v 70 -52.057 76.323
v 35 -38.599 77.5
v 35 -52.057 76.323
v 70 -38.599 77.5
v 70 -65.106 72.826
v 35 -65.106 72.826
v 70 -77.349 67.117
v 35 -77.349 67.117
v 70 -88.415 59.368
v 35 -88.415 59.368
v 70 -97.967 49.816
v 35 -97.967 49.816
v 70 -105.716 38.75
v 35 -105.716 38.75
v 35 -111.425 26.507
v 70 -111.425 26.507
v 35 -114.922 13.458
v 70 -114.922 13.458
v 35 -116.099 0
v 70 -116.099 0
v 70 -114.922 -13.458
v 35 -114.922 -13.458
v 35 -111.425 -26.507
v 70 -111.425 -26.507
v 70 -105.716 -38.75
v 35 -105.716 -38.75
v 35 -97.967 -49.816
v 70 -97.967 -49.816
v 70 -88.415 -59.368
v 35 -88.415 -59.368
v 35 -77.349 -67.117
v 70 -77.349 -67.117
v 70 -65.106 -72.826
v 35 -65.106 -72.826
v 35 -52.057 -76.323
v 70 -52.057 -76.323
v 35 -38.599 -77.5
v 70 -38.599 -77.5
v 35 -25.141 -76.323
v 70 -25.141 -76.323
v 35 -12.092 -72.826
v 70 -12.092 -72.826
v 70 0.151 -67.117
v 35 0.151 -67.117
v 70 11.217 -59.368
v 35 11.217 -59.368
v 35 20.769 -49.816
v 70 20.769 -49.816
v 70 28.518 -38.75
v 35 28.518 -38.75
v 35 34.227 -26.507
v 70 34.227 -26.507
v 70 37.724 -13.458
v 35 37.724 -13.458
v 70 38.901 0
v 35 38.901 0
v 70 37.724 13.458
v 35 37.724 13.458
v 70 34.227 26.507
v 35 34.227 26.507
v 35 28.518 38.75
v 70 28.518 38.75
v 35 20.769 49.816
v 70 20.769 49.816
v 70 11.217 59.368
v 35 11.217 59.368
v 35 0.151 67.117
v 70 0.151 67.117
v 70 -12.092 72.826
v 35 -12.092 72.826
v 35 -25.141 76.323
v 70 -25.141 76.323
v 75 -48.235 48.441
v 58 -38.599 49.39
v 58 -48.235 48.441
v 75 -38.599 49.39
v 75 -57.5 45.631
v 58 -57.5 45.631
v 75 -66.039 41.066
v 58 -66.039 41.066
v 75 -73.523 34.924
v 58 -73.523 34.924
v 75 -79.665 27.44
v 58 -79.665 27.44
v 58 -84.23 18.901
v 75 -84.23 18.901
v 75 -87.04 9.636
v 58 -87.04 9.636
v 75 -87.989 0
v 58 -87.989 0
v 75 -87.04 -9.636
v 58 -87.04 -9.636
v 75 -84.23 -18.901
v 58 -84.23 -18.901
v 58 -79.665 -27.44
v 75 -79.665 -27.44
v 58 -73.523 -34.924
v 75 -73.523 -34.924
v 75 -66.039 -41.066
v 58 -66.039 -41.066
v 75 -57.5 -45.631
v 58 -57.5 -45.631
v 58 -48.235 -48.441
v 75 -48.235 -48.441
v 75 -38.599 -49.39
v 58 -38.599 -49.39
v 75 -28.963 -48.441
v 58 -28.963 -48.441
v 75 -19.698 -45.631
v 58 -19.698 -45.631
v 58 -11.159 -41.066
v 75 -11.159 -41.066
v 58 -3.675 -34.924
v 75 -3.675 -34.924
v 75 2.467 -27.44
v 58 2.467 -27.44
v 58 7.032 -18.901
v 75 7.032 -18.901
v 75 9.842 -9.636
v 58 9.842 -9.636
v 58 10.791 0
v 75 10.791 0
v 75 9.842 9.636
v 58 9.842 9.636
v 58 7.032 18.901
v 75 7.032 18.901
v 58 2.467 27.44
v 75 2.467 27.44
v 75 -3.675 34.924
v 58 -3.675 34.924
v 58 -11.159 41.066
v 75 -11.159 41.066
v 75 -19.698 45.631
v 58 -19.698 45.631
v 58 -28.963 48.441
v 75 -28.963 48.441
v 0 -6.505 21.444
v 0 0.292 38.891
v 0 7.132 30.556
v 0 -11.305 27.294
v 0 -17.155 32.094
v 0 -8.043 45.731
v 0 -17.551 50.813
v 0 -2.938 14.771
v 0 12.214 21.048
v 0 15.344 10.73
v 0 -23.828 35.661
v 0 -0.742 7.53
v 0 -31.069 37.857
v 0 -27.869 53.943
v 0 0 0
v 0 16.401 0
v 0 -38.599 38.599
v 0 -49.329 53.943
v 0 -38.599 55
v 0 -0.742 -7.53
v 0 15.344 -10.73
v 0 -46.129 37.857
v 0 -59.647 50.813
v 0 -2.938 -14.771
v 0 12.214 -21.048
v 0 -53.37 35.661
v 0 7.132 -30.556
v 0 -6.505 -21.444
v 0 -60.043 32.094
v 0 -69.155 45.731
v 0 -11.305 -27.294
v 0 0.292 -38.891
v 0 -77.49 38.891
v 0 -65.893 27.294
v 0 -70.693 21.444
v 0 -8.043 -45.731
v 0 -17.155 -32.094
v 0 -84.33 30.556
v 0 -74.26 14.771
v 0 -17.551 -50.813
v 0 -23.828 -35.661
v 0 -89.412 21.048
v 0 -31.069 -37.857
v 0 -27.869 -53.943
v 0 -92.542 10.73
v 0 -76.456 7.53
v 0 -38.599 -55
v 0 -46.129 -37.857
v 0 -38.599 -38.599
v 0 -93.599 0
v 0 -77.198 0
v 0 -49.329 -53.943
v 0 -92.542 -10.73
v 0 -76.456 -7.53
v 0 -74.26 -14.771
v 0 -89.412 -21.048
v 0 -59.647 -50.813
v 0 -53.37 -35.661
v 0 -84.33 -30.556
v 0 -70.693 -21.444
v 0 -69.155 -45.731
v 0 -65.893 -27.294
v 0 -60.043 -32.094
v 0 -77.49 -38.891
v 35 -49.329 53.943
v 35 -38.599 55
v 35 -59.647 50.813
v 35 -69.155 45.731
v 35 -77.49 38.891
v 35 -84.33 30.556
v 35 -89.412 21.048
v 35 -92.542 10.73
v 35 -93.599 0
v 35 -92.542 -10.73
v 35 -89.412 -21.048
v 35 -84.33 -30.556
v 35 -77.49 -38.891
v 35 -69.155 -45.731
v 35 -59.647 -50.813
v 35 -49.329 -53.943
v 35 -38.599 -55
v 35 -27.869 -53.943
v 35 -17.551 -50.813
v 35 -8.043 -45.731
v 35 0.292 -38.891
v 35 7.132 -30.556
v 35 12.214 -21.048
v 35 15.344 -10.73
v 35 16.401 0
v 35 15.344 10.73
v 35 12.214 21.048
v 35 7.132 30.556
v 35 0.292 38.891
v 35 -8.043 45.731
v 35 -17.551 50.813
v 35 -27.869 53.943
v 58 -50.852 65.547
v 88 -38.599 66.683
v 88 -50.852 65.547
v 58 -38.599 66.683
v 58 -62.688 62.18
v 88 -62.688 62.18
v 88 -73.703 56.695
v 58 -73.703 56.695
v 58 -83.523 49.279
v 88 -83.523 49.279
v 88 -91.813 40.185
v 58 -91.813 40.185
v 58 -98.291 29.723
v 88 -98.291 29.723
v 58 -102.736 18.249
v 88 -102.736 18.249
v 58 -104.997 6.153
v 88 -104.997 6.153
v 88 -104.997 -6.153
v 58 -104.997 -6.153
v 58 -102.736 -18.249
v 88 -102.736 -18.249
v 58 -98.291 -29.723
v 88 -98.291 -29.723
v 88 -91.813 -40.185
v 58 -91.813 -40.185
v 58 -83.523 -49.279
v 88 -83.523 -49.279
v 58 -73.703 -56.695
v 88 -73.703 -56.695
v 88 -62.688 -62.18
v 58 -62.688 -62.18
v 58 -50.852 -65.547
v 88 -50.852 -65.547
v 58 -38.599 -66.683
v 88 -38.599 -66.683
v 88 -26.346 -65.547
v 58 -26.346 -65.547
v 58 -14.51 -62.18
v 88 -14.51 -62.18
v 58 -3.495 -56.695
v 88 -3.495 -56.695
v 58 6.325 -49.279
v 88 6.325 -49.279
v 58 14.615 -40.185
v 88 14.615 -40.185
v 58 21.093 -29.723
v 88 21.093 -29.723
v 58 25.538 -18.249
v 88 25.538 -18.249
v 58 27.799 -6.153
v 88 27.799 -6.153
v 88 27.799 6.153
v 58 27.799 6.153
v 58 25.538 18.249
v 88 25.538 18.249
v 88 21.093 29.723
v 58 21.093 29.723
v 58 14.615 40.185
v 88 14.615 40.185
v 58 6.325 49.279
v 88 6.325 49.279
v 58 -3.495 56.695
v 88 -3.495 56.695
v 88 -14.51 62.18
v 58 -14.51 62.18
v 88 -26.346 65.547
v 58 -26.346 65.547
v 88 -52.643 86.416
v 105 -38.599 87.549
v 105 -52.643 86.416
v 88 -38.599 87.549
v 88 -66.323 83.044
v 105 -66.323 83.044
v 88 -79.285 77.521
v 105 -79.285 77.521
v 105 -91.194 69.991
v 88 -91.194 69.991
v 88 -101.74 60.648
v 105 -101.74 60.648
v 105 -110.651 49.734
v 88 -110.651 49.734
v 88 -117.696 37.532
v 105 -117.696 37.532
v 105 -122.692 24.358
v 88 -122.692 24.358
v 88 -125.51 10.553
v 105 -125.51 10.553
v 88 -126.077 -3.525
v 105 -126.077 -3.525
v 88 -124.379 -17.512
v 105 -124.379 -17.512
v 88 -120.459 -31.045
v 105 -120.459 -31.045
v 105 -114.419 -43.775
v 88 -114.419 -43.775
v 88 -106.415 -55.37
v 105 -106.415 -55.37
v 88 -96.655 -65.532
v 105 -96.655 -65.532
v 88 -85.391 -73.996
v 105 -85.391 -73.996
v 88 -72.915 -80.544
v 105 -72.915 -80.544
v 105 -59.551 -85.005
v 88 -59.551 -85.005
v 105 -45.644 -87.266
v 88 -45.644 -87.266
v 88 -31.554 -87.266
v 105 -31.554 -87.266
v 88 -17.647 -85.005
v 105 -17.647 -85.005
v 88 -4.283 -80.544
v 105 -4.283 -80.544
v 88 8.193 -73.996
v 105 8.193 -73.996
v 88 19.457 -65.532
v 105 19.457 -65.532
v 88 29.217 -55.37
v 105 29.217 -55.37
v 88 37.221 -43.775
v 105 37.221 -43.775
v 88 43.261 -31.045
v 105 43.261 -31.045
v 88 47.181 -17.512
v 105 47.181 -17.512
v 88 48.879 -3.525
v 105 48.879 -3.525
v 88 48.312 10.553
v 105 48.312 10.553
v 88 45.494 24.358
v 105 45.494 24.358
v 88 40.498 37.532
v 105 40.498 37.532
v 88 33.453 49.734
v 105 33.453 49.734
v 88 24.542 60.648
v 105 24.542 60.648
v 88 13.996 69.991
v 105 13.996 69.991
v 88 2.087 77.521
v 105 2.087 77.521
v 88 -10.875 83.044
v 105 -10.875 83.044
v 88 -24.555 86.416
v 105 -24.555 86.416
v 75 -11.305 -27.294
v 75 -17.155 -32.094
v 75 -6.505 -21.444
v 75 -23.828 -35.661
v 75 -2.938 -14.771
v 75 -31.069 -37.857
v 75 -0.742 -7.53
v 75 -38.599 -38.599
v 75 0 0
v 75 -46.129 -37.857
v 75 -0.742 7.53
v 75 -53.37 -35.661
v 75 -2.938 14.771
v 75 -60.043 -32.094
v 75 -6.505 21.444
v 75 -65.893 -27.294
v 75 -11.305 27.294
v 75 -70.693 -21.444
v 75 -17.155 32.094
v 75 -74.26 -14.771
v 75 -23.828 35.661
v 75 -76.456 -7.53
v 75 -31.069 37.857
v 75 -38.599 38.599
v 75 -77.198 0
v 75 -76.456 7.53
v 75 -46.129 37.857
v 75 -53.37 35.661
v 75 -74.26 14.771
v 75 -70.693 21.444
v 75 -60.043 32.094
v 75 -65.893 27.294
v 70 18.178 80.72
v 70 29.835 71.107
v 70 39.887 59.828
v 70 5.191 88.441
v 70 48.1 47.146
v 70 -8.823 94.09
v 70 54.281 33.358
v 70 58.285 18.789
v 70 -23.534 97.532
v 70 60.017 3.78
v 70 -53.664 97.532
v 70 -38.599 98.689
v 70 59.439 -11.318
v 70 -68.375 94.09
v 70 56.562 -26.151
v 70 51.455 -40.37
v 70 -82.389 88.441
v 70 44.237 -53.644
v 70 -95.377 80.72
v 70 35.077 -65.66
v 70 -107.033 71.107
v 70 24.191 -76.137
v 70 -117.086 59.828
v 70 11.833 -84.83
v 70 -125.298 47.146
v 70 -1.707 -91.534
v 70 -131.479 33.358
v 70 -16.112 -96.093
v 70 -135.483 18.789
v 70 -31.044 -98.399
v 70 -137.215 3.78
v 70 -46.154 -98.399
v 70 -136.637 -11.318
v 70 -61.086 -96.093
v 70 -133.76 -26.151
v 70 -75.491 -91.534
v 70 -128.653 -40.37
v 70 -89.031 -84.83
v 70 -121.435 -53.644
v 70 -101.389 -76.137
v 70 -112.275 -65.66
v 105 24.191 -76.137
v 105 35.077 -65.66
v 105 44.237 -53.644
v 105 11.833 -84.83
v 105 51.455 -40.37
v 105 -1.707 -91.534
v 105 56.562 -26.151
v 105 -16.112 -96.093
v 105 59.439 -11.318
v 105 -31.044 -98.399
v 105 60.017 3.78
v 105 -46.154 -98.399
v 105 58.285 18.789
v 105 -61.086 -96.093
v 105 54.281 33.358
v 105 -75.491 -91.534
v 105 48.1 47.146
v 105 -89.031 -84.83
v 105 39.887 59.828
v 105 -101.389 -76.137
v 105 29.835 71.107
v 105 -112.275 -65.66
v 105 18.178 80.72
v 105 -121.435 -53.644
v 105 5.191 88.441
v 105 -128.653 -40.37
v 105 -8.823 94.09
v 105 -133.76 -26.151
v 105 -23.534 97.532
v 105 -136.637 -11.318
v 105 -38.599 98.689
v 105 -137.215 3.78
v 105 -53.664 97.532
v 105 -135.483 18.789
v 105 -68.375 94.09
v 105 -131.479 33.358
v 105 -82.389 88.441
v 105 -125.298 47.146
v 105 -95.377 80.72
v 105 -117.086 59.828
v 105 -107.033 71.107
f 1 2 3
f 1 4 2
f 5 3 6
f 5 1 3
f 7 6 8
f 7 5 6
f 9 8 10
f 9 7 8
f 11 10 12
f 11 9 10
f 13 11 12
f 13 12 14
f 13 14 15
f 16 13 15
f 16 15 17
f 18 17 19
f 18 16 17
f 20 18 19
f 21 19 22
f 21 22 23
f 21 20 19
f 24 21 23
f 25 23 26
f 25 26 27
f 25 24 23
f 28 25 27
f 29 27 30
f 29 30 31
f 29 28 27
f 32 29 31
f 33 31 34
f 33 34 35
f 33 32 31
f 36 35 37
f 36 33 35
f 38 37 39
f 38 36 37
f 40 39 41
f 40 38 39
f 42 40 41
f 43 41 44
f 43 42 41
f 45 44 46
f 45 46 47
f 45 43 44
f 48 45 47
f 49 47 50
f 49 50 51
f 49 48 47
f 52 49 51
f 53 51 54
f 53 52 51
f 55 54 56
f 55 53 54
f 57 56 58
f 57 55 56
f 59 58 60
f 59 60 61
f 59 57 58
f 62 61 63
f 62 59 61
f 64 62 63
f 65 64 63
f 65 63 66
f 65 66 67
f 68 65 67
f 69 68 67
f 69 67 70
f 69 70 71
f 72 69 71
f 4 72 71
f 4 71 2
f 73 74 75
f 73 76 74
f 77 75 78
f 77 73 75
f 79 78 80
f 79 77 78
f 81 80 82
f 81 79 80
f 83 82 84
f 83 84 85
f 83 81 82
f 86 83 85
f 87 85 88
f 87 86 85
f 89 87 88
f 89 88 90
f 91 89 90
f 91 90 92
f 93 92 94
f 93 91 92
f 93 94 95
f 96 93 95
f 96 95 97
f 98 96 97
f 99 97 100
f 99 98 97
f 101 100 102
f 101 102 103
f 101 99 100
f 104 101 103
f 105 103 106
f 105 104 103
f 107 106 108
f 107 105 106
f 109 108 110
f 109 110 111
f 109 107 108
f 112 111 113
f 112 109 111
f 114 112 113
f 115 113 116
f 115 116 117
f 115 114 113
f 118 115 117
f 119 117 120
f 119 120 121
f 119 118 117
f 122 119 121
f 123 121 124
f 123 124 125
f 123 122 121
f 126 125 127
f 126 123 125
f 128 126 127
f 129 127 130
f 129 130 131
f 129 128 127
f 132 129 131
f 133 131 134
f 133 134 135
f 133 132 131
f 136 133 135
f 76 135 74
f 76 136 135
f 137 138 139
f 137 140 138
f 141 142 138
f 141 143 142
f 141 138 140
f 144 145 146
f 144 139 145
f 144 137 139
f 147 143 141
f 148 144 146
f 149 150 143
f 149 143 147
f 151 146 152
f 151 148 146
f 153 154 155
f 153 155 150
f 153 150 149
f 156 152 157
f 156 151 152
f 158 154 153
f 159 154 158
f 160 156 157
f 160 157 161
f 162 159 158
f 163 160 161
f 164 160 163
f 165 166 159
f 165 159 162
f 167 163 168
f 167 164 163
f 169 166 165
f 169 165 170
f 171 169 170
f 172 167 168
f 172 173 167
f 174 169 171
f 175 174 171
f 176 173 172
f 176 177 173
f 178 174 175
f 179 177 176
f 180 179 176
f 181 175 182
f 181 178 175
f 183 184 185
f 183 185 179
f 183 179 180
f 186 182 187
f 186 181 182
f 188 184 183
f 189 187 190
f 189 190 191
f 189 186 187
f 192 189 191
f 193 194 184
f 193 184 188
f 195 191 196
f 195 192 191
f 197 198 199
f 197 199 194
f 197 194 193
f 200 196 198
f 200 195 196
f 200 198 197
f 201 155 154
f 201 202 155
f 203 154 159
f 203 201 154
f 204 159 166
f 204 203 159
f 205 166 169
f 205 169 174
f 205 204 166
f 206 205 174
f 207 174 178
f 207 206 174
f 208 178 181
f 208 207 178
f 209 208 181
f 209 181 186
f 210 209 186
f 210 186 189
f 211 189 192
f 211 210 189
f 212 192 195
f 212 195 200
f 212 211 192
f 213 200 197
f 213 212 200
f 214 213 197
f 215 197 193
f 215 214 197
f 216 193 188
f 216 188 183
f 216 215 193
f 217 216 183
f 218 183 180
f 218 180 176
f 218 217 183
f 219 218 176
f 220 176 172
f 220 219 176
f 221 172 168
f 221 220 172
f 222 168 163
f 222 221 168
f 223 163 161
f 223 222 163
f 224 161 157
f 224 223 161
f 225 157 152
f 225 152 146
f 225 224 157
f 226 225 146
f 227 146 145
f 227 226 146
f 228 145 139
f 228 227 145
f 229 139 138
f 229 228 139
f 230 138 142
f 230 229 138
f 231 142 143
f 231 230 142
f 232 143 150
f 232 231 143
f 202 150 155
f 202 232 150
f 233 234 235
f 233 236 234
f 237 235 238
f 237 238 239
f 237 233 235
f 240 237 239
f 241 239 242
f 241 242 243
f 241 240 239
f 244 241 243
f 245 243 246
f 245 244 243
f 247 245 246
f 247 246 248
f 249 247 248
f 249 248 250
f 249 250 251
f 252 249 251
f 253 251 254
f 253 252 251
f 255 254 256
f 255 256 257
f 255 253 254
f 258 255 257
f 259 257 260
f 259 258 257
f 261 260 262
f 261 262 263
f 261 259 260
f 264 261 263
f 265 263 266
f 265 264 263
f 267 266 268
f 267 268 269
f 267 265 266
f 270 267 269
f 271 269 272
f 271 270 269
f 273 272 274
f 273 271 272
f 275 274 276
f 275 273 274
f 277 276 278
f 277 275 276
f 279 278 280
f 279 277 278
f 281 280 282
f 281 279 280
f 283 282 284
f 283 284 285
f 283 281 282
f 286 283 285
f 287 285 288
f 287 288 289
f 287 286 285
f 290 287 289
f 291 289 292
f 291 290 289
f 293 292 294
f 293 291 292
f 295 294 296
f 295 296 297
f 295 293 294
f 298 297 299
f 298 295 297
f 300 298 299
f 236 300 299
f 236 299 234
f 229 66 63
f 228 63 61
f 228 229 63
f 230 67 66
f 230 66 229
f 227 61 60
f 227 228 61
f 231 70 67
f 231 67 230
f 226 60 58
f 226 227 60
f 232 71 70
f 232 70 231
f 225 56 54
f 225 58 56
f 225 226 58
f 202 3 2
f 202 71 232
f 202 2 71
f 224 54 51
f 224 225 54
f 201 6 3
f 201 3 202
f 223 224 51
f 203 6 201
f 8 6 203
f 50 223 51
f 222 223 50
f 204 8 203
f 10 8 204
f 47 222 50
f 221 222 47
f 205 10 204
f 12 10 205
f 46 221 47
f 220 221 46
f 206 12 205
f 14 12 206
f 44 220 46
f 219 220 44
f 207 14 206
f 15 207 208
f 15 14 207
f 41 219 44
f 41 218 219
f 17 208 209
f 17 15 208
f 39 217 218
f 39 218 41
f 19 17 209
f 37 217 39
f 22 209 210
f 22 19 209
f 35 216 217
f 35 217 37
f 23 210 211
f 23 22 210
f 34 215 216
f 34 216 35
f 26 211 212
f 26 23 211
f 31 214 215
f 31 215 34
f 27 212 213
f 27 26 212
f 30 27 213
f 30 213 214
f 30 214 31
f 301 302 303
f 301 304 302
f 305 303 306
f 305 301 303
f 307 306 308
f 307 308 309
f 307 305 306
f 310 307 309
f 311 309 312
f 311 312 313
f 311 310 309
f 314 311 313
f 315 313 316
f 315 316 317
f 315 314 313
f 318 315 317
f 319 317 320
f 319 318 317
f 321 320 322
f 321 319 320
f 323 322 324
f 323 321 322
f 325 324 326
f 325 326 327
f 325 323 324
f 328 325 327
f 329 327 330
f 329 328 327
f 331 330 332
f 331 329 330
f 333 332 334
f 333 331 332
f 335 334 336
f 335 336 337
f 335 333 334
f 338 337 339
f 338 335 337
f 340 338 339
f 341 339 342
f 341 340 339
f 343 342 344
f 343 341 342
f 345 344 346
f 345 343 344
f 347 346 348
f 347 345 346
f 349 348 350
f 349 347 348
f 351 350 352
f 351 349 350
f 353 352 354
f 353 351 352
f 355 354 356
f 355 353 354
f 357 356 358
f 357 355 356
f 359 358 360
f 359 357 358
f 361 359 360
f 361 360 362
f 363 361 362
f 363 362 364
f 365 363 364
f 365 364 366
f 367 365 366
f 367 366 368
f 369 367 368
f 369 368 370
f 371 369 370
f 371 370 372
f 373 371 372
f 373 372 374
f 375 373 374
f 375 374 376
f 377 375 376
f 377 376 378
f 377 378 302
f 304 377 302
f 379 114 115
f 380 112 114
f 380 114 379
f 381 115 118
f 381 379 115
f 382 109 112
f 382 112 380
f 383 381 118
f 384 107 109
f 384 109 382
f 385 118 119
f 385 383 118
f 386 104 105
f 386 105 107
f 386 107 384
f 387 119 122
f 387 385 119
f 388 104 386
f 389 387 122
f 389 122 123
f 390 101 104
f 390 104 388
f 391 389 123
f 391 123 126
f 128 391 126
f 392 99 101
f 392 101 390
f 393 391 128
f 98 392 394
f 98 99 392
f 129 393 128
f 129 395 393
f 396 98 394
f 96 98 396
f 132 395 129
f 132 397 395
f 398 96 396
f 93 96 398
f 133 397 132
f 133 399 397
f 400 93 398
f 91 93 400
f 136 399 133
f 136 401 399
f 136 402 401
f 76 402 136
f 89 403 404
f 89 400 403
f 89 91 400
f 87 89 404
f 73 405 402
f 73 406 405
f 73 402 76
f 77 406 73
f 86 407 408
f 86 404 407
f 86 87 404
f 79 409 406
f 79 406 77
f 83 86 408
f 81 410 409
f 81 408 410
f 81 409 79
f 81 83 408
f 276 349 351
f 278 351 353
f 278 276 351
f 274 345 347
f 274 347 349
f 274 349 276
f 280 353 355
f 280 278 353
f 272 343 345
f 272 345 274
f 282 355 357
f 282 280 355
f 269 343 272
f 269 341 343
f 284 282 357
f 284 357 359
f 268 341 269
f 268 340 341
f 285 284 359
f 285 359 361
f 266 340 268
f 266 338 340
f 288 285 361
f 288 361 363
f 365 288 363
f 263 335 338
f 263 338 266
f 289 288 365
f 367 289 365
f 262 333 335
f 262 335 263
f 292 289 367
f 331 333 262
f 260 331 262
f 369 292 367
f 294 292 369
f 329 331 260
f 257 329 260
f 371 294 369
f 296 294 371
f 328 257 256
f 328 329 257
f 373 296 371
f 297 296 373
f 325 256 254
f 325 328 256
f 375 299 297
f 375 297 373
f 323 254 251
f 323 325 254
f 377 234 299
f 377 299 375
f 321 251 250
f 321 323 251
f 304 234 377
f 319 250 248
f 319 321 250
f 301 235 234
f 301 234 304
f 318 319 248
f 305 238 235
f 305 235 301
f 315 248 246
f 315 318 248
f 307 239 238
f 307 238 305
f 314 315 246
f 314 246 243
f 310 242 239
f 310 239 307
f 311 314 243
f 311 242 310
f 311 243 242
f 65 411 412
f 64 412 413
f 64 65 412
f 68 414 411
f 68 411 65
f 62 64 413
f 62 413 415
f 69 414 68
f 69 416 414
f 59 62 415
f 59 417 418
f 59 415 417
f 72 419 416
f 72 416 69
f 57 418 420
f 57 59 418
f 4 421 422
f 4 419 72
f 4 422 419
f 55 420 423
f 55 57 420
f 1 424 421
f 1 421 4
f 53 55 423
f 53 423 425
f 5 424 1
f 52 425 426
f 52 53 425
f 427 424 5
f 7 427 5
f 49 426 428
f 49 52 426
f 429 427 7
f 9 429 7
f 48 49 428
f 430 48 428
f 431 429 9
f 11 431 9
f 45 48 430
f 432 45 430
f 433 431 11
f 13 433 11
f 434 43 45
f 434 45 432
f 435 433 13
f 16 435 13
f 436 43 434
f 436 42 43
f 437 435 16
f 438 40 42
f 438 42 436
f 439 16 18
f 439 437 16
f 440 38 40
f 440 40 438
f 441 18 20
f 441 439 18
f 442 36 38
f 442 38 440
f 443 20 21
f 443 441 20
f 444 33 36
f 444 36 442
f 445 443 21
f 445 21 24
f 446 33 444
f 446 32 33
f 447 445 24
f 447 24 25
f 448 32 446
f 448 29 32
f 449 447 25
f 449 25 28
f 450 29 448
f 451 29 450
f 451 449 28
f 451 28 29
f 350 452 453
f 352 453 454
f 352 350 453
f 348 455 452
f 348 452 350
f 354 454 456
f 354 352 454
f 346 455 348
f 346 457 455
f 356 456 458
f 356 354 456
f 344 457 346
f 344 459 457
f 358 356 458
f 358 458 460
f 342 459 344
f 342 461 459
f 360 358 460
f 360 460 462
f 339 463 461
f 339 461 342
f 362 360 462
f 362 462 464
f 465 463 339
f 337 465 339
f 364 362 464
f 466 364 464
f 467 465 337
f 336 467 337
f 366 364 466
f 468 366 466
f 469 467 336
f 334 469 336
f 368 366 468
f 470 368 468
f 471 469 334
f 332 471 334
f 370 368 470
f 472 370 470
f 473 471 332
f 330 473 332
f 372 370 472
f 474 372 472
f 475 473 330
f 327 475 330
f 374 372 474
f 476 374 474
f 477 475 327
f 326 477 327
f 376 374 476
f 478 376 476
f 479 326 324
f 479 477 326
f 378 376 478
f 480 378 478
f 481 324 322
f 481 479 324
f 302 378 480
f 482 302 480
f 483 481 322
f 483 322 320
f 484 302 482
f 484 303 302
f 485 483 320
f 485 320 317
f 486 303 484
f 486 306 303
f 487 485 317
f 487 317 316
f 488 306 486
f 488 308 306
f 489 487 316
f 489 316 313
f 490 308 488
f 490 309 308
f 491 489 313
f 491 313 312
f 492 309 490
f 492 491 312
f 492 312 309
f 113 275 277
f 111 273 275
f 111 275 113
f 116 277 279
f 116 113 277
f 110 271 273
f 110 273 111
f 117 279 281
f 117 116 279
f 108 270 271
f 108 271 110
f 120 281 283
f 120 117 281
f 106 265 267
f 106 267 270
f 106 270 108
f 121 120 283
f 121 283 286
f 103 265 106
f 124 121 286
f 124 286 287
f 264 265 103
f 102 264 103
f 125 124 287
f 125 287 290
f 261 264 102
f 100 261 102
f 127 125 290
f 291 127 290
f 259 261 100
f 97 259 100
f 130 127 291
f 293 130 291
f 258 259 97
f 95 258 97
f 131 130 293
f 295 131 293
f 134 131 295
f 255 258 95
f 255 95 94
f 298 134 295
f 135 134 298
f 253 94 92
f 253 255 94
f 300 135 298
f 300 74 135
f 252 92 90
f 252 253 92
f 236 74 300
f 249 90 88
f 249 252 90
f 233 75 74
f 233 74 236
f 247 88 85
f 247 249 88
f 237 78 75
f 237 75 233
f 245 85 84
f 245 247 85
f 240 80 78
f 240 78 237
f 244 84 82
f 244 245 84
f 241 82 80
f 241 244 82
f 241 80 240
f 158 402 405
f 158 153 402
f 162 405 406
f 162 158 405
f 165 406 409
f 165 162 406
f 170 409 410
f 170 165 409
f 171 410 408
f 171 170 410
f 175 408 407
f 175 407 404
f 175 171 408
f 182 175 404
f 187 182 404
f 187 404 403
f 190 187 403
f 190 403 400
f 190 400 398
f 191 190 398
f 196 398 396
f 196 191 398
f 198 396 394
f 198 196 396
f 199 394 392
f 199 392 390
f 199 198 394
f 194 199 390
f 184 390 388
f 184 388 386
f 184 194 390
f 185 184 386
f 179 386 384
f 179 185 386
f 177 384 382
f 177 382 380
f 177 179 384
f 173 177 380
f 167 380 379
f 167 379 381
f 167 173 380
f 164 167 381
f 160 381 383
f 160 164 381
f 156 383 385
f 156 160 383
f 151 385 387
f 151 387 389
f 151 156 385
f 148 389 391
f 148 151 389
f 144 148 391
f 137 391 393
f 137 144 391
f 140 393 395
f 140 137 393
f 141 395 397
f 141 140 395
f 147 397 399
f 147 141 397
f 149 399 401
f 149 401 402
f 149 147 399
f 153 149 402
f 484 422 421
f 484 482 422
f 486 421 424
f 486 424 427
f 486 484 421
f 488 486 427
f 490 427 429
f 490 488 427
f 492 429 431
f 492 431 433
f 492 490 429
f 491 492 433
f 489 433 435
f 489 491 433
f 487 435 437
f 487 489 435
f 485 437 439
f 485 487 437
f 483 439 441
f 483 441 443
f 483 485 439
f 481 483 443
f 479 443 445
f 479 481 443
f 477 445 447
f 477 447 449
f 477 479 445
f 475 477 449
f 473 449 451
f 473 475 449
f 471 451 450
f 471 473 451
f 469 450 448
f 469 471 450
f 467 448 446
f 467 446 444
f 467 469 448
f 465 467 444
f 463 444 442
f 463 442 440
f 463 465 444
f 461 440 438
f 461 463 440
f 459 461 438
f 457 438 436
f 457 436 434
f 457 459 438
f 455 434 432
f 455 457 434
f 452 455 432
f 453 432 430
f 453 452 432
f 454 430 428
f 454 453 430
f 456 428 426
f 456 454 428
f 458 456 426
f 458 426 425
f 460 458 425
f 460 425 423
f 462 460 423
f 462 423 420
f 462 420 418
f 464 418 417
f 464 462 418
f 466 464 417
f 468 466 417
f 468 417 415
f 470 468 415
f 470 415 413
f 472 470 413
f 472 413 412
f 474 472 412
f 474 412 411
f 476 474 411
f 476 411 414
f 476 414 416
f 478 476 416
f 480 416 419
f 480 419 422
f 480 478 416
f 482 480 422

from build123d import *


with BuildPart() as part:
    # Croquis1 → Revolución1 (revolve)
    with BuildSketch(Plane.XY, mode=Mode.PRIVATE) as revoluci_n1_sk:
        Polygon((0, 0), (0, 16.40097141), (35, 16.40097141), (35, 38.90097141), (70, 38.90097141), (70, 60.089754962), (105, 60.089754962), (105, 48.950400909), (88, 48.950400909), (88, 28.083723598), (58, 28.083723598), (58, 10.791148393), (75, 10.791148393), (75, 0), align=None)
    revolve(revoluci_n1_sk.sketch.rotate(Axis((0, -38.59902859, 0), (1, 0, 0)), 90), axis=Axis((0, -38.59902859, 0), (1, 0, 0)))


solid = part.part
